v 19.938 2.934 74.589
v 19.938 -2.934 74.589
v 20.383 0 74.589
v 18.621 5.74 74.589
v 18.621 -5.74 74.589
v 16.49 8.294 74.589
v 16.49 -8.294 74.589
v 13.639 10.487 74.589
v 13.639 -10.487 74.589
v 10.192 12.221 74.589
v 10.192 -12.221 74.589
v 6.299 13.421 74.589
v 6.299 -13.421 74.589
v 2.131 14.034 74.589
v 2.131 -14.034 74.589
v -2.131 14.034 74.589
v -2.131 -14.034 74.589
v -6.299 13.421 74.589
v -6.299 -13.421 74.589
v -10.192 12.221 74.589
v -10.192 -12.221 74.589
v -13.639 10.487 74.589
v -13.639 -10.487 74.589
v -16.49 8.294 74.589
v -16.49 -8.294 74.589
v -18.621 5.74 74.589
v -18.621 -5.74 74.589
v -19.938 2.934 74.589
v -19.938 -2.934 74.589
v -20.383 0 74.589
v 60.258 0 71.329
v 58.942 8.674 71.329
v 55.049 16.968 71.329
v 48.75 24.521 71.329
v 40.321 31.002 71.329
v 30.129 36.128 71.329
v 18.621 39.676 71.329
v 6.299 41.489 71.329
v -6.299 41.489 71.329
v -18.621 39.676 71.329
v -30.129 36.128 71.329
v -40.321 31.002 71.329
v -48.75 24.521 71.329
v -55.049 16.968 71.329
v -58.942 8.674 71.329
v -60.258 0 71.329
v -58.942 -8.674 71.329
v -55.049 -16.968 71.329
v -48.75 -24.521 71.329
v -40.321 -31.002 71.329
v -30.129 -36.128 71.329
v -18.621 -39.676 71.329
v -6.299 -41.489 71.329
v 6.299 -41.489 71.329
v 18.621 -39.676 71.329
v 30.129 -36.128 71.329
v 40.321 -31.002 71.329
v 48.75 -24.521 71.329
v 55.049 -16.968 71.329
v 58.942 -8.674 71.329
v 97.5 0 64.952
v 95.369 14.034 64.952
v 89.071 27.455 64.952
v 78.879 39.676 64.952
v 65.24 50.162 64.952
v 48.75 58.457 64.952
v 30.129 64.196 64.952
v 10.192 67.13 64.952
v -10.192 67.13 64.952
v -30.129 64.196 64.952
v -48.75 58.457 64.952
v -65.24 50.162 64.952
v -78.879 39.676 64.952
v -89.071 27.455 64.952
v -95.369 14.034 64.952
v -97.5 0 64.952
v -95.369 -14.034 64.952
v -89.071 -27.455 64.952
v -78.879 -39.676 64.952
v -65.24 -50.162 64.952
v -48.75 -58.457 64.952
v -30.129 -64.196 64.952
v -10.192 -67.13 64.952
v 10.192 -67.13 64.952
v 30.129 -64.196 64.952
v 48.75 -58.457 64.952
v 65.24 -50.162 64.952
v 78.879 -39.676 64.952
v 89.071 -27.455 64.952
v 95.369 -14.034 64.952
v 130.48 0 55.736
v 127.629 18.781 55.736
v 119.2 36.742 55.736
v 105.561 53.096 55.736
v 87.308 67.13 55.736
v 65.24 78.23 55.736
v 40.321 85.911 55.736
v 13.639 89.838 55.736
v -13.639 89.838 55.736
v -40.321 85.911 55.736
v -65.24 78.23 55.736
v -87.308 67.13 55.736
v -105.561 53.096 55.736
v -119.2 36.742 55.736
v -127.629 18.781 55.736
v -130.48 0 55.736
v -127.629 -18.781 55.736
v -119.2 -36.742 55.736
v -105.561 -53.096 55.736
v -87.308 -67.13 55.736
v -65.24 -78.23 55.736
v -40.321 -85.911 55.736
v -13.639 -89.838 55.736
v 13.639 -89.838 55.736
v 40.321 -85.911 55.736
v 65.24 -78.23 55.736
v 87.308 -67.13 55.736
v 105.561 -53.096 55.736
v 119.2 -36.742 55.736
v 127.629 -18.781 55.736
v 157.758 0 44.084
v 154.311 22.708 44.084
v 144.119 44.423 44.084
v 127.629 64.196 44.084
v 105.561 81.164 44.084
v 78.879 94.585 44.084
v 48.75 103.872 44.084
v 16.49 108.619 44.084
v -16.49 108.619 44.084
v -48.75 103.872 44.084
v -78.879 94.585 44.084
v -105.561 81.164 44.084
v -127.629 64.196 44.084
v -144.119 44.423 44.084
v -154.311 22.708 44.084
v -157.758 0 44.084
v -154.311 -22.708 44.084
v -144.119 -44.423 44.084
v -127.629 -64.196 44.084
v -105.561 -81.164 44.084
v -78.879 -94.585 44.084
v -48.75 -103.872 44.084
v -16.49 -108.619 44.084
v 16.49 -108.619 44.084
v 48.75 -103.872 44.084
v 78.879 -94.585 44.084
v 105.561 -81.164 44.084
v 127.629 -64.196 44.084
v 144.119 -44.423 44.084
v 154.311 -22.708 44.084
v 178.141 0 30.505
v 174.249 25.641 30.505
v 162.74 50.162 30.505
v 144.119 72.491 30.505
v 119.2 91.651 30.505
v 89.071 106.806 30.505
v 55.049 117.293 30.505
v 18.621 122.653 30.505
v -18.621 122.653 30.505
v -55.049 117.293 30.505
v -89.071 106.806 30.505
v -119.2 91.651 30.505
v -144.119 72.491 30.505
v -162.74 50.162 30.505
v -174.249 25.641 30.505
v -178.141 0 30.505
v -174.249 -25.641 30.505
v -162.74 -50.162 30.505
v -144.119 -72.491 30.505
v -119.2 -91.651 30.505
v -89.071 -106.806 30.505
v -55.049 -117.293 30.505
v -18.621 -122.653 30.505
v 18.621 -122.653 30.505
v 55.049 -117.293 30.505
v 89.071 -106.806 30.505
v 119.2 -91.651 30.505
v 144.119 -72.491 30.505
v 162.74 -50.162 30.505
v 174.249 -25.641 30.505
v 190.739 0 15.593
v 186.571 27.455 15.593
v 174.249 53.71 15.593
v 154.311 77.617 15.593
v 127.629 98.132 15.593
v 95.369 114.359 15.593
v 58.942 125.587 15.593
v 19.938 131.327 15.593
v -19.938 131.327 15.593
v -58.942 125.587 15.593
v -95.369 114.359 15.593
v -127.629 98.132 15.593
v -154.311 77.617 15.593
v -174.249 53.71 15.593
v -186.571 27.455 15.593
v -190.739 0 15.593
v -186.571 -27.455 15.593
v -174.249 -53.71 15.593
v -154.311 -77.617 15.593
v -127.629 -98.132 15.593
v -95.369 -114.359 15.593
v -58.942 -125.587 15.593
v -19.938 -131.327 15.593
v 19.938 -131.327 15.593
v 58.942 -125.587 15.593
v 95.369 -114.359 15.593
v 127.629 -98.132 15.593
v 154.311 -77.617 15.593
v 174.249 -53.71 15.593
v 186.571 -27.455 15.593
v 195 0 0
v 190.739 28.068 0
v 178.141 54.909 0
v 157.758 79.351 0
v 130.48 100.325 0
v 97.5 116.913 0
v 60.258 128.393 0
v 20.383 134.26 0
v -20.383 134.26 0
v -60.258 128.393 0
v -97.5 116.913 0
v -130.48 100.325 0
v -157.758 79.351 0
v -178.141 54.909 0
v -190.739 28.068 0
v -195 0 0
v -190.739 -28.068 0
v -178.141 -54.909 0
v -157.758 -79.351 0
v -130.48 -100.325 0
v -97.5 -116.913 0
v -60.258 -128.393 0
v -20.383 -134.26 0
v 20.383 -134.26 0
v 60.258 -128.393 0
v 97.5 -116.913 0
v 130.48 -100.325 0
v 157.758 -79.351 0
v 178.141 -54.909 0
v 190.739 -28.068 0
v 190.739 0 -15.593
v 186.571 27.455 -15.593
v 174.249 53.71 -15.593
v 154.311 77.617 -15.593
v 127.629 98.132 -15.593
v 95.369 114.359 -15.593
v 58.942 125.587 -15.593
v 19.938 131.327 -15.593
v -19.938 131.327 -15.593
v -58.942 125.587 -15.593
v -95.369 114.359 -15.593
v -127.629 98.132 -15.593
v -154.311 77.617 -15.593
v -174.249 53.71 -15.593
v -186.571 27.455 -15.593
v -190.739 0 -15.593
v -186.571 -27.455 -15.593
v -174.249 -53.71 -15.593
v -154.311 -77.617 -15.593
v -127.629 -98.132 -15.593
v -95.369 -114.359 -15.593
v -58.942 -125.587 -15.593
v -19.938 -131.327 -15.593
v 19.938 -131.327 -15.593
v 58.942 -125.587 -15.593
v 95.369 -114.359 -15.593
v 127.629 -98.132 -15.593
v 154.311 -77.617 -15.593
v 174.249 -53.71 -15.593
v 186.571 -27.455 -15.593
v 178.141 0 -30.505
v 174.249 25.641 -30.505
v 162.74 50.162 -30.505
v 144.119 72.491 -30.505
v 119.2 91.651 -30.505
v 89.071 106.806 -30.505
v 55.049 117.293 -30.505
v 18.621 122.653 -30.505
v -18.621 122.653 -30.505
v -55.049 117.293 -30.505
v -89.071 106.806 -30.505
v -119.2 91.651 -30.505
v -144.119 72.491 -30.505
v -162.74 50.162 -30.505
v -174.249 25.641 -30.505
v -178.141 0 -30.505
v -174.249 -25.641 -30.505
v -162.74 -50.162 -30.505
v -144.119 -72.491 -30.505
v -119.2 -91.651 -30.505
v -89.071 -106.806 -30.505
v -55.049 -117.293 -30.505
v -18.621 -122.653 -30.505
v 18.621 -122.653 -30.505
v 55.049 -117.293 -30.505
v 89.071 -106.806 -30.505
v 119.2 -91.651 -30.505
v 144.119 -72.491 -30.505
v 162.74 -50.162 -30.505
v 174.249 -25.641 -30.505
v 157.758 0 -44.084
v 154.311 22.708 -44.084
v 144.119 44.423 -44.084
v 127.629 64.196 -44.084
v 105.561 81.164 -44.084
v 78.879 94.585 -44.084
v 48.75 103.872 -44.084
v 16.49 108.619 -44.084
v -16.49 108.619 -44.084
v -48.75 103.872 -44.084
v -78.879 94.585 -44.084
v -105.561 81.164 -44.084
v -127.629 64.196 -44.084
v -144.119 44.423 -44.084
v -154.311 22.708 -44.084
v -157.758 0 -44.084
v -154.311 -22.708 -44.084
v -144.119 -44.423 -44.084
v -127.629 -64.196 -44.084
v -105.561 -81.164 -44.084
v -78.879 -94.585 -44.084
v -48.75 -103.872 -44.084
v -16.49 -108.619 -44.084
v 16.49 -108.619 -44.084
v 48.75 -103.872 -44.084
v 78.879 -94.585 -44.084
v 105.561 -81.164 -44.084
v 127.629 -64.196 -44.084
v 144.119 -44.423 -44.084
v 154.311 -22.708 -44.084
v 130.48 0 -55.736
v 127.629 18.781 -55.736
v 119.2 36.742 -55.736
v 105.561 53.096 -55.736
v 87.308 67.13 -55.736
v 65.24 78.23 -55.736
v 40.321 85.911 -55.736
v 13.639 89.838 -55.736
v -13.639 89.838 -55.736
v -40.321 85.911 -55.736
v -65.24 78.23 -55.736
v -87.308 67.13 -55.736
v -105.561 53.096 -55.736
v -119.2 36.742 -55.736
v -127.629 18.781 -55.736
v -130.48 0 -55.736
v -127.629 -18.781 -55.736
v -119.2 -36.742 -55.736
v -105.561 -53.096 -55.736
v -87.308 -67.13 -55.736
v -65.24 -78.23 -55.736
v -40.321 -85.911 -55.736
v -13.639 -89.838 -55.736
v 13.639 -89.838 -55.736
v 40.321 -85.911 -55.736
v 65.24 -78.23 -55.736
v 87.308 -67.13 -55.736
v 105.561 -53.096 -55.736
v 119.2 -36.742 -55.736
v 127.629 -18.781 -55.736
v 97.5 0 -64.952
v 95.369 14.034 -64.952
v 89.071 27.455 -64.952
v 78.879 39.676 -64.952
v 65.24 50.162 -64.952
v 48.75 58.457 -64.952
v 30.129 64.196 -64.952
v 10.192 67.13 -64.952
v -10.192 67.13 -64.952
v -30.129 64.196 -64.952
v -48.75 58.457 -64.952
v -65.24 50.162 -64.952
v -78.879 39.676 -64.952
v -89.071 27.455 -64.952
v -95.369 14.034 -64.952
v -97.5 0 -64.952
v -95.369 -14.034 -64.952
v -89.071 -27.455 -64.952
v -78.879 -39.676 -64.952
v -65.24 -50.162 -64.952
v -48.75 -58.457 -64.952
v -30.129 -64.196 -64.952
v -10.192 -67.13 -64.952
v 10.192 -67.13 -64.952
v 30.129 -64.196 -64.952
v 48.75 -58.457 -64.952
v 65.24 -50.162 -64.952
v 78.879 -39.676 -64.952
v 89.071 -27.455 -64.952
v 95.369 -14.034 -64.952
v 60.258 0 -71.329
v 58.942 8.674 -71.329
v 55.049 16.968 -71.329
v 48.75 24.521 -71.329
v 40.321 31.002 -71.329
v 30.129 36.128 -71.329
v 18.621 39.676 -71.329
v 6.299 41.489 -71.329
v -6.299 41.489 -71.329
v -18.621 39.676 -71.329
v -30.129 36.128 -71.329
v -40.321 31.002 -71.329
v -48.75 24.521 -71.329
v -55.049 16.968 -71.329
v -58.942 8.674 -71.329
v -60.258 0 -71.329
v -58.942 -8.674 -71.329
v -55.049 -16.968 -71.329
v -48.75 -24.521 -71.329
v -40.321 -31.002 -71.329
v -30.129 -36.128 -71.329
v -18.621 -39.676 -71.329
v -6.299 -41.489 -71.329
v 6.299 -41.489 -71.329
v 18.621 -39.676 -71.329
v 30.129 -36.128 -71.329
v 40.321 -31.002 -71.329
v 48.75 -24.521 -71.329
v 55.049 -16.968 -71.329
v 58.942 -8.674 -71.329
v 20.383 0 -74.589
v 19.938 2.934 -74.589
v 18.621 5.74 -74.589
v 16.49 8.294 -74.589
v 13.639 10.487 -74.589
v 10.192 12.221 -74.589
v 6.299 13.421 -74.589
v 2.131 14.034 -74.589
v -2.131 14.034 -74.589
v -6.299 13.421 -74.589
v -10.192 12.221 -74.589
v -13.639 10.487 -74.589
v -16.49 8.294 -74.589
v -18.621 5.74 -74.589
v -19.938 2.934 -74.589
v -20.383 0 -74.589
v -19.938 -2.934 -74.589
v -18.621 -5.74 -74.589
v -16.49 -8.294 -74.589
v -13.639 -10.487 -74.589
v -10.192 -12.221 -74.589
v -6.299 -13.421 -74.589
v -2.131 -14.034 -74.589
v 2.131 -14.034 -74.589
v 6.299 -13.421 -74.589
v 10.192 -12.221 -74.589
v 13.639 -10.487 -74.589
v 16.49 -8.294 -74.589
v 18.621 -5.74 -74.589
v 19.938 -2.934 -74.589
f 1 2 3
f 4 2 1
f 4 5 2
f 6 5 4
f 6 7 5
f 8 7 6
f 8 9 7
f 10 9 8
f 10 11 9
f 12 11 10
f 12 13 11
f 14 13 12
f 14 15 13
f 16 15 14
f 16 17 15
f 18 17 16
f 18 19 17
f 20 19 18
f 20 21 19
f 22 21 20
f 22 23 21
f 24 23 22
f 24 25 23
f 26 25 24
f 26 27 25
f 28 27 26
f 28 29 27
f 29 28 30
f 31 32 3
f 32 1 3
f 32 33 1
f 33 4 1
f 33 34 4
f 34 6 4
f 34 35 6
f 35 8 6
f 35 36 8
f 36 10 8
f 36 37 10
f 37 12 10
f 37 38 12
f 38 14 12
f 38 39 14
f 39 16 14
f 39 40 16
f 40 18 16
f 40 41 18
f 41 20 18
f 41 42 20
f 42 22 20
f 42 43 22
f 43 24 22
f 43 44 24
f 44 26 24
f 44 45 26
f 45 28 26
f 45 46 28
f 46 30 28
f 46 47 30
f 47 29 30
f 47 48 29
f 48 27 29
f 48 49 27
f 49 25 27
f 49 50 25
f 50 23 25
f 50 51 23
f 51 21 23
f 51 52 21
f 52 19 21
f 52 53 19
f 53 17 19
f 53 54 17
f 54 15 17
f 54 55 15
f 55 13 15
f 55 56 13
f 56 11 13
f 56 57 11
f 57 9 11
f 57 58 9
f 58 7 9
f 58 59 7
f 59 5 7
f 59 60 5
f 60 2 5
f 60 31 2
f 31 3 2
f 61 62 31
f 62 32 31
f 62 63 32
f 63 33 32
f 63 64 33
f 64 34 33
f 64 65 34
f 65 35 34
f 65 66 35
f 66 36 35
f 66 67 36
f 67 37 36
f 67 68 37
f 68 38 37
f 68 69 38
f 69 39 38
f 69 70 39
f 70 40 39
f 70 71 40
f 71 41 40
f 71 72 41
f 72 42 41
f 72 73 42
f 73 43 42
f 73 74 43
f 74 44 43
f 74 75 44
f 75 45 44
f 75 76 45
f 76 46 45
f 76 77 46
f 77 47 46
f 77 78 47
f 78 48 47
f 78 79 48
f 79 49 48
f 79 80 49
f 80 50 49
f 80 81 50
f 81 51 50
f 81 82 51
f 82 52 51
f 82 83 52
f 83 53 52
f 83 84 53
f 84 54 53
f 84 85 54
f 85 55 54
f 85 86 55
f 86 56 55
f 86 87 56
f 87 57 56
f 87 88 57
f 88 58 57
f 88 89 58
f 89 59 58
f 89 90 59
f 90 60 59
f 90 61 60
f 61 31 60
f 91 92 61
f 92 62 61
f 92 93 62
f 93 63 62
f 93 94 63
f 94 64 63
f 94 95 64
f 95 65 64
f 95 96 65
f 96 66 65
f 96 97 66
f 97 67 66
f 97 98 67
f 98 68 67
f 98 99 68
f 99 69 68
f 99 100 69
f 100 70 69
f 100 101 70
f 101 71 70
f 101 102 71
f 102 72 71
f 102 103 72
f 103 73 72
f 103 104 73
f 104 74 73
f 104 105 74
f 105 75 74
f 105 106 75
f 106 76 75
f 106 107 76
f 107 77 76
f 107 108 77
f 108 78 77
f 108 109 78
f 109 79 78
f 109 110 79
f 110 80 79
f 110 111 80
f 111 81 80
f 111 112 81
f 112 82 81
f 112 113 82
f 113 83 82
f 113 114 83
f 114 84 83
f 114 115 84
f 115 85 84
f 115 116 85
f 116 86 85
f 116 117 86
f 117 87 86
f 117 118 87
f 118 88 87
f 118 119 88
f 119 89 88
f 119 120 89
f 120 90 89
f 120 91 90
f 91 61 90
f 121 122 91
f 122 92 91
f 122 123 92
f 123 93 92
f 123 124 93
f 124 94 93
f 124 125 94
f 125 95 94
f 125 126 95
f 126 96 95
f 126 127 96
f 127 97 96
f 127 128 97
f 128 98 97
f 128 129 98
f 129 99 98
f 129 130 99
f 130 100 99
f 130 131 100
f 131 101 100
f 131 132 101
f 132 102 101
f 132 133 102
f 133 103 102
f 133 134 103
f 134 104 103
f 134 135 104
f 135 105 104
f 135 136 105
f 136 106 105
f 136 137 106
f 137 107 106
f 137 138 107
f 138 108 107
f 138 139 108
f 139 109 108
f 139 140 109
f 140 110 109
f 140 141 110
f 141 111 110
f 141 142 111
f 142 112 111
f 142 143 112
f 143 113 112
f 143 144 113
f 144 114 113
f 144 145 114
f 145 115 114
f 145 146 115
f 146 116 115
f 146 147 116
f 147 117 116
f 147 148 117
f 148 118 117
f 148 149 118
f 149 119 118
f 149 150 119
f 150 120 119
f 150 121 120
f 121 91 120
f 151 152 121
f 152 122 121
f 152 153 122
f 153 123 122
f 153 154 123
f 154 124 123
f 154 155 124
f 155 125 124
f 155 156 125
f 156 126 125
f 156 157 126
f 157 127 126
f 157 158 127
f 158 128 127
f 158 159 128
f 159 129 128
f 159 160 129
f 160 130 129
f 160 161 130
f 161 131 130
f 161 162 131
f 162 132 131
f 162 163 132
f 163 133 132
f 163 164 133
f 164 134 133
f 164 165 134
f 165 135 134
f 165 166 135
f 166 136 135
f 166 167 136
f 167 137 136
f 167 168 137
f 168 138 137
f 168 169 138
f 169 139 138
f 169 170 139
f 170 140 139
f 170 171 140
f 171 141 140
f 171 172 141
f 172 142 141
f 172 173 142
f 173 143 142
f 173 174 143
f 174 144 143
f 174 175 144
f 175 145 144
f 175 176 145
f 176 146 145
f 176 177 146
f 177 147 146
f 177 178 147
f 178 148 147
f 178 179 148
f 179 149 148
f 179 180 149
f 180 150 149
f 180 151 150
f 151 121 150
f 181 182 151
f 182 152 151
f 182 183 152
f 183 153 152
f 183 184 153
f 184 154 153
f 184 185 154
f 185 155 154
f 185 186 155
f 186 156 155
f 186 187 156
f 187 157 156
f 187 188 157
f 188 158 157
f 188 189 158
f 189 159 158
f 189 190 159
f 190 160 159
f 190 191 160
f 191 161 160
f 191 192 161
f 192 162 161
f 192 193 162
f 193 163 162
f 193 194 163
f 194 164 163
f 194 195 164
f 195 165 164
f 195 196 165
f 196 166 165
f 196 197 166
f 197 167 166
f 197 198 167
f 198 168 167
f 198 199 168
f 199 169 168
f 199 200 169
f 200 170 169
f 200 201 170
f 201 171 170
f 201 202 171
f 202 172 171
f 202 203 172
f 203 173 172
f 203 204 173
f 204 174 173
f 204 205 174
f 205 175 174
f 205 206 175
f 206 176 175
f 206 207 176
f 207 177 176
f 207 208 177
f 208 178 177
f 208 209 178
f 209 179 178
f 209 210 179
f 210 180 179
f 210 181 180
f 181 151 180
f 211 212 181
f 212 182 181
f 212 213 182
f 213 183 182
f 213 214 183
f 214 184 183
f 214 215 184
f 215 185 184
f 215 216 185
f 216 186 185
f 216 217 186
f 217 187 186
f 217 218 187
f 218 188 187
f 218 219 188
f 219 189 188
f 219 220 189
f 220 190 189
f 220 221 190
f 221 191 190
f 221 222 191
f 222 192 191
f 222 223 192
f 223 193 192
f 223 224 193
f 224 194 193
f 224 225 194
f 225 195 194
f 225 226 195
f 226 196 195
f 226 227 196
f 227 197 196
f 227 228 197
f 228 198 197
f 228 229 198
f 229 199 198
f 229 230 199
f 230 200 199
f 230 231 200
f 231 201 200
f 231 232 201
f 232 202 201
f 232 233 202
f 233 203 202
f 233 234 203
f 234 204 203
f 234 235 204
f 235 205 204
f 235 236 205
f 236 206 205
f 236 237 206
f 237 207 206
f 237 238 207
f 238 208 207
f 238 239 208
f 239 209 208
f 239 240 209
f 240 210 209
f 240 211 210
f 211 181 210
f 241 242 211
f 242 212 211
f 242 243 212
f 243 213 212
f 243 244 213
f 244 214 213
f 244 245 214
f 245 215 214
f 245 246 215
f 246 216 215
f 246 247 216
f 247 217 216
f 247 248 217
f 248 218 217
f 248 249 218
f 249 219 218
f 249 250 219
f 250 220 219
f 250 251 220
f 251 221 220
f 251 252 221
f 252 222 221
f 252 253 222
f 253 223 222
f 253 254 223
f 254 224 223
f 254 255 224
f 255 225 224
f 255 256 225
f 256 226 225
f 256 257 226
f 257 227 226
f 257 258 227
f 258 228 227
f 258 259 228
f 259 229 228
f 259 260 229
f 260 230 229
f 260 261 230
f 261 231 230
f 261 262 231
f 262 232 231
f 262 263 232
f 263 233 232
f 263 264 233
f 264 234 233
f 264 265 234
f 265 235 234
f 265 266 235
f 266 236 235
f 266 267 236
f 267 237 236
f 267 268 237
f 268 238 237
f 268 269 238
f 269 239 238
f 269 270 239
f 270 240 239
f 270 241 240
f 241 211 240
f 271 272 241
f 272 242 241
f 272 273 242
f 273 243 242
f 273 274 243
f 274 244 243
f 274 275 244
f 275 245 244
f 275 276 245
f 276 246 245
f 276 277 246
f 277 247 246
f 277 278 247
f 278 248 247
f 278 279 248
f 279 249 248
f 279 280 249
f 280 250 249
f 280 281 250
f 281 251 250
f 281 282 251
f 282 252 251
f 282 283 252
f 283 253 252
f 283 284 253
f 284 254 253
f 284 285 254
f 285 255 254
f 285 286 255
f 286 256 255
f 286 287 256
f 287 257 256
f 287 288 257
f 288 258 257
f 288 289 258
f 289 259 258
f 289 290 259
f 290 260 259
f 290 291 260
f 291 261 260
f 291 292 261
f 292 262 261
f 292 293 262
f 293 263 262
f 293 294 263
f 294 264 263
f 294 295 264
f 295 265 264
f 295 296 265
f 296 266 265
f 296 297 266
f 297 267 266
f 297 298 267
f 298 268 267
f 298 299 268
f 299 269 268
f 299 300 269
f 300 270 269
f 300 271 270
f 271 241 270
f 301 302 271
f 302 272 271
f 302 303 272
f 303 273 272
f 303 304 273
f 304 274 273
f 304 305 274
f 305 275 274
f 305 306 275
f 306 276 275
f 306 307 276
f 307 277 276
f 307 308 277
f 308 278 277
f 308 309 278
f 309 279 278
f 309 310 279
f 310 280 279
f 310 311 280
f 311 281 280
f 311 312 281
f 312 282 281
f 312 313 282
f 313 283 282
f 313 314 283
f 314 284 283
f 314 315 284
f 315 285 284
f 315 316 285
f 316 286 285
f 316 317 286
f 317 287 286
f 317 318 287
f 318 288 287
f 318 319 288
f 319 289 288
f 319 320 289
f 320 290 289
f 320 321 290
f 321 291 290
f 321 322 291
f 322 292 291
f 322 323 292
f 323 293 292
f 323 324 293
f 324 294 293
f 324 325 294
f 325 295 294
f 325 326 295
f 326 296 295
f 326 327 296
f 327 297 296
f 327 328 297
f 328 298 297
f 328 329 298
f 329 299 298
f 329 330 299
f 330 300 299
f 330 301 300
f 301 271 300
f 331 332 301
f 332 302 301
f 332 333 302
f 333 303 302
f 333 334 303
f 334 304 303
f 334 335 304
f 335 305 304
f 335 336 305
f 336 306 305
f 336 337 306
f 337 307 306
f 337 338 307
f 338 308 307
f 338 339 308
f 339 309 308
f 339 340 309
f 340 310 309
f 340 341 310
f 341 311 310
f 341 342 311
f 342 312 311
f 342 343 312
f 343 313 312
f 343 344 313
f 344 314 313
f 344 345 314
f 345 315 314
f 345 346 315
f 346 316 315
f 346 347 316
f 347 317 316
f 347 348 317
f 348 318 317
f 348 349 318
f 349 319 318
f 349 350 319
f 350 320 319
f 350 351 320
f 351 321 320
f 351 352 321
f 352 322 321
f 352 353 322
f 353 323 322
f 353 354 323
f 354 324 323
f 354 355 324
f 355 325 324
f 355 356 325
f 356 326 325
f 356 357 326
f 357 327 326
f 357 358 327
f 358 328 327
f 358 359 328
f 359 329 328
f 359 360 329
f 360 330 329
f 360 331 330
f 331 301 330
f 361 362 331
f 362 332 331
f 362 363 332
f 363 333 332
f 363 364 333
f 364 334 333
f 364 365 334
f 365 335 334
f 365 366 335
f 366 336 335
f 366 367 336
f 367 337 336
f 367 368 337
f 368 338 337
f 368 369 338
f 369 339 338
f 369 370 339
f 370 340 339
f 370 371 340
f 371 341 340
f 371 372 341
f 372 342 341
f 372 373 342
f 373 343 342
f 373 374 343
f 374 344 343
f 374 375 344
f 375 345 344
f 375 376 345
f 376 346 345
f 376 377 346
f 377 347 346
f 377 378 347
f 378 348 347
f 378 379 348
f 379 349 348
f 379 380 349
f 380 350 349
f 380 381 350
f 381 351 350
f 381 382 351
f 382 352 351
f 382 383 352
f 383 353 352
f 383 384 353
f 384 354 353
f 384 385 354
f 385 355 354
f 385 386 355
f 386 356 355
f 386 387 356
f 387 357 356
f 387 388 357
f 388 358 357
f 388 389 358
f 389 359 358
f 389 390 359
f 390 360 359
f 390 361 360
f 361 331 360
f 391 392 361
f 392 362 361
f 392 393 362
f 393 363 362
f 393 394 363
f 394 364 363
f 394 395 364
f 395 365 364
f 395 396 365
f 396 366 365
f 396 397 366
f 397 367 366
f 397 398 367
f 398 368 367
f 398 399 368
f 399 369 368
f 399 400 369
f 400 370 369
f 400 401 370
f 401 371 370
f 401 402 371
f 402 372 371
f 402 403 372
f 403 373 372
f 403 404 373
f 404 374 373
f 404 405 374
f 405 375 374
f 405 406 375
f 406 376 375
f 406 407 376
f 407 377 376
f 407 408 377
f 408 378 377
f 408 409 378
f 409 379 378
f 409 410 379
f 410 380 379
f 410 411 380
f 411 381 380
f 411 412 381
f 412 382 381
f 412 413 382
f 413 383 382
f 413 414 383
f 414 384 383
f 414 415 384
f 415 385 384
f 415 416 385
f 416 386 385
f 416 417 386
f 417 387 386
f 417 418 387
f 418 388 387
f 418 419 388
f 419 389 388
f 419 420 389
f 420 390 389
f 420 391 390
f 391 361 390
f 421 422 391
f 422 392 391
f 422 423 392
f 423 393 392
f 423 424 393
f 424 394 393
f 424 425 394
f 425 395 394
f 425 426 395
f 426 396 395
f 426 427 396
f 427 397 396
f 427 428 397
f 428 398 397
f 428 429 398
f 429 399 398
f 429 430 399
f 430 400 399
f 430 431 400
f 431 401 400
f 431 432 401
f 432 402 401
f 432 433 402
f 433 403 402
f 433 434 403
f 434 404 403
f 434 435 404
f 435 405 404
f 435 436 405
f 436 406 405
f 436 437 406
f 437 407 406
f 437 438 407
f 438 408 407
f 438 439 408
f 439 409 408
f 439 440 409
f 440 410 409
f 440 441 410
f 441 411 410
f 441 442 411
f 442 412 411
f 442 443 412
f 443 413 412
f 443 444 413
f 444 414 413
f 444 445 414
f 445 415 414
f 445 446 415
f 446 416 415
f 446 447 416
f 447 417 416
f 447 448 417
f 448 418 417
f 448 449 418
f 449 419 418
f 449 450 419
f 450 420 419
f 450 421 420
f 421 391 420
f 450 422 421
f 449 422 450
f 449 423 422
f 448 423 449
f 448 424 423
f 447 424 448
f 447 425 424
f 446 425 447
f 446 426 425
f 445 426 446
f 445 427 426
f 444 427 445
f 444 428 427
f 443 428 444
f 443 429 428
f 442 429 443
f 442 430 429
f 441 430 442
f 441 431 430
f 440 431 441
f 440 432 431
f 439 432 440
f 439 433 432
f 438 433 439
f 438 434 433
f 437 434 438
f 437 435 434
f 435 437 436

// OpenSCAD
// Generated by SolidPython 1.0.1 on 2020-07-29 00:46:50


scale(v = [13, 9, 5]) {
	sphere(r = 15);
}
/***********************************************
*********      SolidPython code:      **********
************************************************
 
# import packages: SolidPython
from solid import *
from solid.utils import *
from itertools import chain, combinations, permutations


class Resize:

    def __init__(self, scad_file):
        self.scad_file = scad_file
        #self.scad_file = import_scad(scad_file)
        # cone/cylinder param:
        self.r1 = 0
        self.r2 = 0
        self.h = 0
        # rectangular prism param:
        self.w = 0
        self.l = 0
        # ellipse param:
        self.r = 0

    # import OpenScad code (file name corresponds to shape)


    # classify shape + parameters
    def assign(self, param1, param2, param3):
        if self.scad_file == 'cone.scad':
            self.r1 = param1
            self.r2 = param2
            self.h = param3
        elif self.scad_file == 'cylinder.scad':
            self.r1 = param1
            self.r2 = param2
            self.h = param3
        elif self.scad_file == 'rectangularPrism.scad':
            self.h = param1
            self.l = param2
            self.w = param3
        else:
            self.r = param1
            self.h = param2

    # resize parameters
    def iterate(self):
        x = range(3, 20, 2)
        i = 1
        if self.scad_file == 'cone.scad':
            tempList = list(permutations(x, 2))
            for temp in tempList:
                param1 = temp[0]
                param2 = temp[1]
                filepath = 'produced_scad_files/' + 'cone' + str(param1) + '_' + str(param2) + '_' + '.scad'
                scad_render_to_file(cylinder(h=param1, r1=param2, r2=0), filepath)

        elif self.scad_file == 'cylinder.scad':
            tempList = list(permutations(x, 3))
            for temp in tempList:
                param1 = temp[0]
                param2 = temp[1]
                filepath = 'produced_scad_files/' + 'cylinder' + str(param1) + '_' + str(param2) + '_' + '.scad'
                scad_render_to_file(cylinder(h=param1, r1=param2, r2=param2), filepath)

        elif self.scad_file == 'rectangularPrism.scad':
            tempList = list(permutations(x, 3))
            for temp in tempList:
                param1 = temp[0]
                param2 = temp[1]
                param3 = temp[2]
                filepath = 'produced_scad_files/' + 'rectangularPrism' + str(param1) + '_' + str(param2) + '_' + str(
                    param3) + '.scad'
                scad_render_to_file(cube(size=(param1, param2, param3)), filepath)

        elif self.scad_file == 'ellipse.scad':
            tempList = list(permutations(x, 4))
            for temp in tempList:
                param1 = temp[0]
                param2 = temp[1]
                param3 = temp[2]
                param4 = temp[3]
                filepath = 'produced_scad_files/' + 'ellipse' + str(param1) + '_' + str(param2) + '_' + str(param3) + '_' + str(param4) + '.scad'
                scad_render_to_file(scale([param1, param2, param3])(sphere(r=param4)), filepath)

    def render_to_scadfile(self):
        scad_render_to_file(scad, 'example.scad') 
 
************************************************/
